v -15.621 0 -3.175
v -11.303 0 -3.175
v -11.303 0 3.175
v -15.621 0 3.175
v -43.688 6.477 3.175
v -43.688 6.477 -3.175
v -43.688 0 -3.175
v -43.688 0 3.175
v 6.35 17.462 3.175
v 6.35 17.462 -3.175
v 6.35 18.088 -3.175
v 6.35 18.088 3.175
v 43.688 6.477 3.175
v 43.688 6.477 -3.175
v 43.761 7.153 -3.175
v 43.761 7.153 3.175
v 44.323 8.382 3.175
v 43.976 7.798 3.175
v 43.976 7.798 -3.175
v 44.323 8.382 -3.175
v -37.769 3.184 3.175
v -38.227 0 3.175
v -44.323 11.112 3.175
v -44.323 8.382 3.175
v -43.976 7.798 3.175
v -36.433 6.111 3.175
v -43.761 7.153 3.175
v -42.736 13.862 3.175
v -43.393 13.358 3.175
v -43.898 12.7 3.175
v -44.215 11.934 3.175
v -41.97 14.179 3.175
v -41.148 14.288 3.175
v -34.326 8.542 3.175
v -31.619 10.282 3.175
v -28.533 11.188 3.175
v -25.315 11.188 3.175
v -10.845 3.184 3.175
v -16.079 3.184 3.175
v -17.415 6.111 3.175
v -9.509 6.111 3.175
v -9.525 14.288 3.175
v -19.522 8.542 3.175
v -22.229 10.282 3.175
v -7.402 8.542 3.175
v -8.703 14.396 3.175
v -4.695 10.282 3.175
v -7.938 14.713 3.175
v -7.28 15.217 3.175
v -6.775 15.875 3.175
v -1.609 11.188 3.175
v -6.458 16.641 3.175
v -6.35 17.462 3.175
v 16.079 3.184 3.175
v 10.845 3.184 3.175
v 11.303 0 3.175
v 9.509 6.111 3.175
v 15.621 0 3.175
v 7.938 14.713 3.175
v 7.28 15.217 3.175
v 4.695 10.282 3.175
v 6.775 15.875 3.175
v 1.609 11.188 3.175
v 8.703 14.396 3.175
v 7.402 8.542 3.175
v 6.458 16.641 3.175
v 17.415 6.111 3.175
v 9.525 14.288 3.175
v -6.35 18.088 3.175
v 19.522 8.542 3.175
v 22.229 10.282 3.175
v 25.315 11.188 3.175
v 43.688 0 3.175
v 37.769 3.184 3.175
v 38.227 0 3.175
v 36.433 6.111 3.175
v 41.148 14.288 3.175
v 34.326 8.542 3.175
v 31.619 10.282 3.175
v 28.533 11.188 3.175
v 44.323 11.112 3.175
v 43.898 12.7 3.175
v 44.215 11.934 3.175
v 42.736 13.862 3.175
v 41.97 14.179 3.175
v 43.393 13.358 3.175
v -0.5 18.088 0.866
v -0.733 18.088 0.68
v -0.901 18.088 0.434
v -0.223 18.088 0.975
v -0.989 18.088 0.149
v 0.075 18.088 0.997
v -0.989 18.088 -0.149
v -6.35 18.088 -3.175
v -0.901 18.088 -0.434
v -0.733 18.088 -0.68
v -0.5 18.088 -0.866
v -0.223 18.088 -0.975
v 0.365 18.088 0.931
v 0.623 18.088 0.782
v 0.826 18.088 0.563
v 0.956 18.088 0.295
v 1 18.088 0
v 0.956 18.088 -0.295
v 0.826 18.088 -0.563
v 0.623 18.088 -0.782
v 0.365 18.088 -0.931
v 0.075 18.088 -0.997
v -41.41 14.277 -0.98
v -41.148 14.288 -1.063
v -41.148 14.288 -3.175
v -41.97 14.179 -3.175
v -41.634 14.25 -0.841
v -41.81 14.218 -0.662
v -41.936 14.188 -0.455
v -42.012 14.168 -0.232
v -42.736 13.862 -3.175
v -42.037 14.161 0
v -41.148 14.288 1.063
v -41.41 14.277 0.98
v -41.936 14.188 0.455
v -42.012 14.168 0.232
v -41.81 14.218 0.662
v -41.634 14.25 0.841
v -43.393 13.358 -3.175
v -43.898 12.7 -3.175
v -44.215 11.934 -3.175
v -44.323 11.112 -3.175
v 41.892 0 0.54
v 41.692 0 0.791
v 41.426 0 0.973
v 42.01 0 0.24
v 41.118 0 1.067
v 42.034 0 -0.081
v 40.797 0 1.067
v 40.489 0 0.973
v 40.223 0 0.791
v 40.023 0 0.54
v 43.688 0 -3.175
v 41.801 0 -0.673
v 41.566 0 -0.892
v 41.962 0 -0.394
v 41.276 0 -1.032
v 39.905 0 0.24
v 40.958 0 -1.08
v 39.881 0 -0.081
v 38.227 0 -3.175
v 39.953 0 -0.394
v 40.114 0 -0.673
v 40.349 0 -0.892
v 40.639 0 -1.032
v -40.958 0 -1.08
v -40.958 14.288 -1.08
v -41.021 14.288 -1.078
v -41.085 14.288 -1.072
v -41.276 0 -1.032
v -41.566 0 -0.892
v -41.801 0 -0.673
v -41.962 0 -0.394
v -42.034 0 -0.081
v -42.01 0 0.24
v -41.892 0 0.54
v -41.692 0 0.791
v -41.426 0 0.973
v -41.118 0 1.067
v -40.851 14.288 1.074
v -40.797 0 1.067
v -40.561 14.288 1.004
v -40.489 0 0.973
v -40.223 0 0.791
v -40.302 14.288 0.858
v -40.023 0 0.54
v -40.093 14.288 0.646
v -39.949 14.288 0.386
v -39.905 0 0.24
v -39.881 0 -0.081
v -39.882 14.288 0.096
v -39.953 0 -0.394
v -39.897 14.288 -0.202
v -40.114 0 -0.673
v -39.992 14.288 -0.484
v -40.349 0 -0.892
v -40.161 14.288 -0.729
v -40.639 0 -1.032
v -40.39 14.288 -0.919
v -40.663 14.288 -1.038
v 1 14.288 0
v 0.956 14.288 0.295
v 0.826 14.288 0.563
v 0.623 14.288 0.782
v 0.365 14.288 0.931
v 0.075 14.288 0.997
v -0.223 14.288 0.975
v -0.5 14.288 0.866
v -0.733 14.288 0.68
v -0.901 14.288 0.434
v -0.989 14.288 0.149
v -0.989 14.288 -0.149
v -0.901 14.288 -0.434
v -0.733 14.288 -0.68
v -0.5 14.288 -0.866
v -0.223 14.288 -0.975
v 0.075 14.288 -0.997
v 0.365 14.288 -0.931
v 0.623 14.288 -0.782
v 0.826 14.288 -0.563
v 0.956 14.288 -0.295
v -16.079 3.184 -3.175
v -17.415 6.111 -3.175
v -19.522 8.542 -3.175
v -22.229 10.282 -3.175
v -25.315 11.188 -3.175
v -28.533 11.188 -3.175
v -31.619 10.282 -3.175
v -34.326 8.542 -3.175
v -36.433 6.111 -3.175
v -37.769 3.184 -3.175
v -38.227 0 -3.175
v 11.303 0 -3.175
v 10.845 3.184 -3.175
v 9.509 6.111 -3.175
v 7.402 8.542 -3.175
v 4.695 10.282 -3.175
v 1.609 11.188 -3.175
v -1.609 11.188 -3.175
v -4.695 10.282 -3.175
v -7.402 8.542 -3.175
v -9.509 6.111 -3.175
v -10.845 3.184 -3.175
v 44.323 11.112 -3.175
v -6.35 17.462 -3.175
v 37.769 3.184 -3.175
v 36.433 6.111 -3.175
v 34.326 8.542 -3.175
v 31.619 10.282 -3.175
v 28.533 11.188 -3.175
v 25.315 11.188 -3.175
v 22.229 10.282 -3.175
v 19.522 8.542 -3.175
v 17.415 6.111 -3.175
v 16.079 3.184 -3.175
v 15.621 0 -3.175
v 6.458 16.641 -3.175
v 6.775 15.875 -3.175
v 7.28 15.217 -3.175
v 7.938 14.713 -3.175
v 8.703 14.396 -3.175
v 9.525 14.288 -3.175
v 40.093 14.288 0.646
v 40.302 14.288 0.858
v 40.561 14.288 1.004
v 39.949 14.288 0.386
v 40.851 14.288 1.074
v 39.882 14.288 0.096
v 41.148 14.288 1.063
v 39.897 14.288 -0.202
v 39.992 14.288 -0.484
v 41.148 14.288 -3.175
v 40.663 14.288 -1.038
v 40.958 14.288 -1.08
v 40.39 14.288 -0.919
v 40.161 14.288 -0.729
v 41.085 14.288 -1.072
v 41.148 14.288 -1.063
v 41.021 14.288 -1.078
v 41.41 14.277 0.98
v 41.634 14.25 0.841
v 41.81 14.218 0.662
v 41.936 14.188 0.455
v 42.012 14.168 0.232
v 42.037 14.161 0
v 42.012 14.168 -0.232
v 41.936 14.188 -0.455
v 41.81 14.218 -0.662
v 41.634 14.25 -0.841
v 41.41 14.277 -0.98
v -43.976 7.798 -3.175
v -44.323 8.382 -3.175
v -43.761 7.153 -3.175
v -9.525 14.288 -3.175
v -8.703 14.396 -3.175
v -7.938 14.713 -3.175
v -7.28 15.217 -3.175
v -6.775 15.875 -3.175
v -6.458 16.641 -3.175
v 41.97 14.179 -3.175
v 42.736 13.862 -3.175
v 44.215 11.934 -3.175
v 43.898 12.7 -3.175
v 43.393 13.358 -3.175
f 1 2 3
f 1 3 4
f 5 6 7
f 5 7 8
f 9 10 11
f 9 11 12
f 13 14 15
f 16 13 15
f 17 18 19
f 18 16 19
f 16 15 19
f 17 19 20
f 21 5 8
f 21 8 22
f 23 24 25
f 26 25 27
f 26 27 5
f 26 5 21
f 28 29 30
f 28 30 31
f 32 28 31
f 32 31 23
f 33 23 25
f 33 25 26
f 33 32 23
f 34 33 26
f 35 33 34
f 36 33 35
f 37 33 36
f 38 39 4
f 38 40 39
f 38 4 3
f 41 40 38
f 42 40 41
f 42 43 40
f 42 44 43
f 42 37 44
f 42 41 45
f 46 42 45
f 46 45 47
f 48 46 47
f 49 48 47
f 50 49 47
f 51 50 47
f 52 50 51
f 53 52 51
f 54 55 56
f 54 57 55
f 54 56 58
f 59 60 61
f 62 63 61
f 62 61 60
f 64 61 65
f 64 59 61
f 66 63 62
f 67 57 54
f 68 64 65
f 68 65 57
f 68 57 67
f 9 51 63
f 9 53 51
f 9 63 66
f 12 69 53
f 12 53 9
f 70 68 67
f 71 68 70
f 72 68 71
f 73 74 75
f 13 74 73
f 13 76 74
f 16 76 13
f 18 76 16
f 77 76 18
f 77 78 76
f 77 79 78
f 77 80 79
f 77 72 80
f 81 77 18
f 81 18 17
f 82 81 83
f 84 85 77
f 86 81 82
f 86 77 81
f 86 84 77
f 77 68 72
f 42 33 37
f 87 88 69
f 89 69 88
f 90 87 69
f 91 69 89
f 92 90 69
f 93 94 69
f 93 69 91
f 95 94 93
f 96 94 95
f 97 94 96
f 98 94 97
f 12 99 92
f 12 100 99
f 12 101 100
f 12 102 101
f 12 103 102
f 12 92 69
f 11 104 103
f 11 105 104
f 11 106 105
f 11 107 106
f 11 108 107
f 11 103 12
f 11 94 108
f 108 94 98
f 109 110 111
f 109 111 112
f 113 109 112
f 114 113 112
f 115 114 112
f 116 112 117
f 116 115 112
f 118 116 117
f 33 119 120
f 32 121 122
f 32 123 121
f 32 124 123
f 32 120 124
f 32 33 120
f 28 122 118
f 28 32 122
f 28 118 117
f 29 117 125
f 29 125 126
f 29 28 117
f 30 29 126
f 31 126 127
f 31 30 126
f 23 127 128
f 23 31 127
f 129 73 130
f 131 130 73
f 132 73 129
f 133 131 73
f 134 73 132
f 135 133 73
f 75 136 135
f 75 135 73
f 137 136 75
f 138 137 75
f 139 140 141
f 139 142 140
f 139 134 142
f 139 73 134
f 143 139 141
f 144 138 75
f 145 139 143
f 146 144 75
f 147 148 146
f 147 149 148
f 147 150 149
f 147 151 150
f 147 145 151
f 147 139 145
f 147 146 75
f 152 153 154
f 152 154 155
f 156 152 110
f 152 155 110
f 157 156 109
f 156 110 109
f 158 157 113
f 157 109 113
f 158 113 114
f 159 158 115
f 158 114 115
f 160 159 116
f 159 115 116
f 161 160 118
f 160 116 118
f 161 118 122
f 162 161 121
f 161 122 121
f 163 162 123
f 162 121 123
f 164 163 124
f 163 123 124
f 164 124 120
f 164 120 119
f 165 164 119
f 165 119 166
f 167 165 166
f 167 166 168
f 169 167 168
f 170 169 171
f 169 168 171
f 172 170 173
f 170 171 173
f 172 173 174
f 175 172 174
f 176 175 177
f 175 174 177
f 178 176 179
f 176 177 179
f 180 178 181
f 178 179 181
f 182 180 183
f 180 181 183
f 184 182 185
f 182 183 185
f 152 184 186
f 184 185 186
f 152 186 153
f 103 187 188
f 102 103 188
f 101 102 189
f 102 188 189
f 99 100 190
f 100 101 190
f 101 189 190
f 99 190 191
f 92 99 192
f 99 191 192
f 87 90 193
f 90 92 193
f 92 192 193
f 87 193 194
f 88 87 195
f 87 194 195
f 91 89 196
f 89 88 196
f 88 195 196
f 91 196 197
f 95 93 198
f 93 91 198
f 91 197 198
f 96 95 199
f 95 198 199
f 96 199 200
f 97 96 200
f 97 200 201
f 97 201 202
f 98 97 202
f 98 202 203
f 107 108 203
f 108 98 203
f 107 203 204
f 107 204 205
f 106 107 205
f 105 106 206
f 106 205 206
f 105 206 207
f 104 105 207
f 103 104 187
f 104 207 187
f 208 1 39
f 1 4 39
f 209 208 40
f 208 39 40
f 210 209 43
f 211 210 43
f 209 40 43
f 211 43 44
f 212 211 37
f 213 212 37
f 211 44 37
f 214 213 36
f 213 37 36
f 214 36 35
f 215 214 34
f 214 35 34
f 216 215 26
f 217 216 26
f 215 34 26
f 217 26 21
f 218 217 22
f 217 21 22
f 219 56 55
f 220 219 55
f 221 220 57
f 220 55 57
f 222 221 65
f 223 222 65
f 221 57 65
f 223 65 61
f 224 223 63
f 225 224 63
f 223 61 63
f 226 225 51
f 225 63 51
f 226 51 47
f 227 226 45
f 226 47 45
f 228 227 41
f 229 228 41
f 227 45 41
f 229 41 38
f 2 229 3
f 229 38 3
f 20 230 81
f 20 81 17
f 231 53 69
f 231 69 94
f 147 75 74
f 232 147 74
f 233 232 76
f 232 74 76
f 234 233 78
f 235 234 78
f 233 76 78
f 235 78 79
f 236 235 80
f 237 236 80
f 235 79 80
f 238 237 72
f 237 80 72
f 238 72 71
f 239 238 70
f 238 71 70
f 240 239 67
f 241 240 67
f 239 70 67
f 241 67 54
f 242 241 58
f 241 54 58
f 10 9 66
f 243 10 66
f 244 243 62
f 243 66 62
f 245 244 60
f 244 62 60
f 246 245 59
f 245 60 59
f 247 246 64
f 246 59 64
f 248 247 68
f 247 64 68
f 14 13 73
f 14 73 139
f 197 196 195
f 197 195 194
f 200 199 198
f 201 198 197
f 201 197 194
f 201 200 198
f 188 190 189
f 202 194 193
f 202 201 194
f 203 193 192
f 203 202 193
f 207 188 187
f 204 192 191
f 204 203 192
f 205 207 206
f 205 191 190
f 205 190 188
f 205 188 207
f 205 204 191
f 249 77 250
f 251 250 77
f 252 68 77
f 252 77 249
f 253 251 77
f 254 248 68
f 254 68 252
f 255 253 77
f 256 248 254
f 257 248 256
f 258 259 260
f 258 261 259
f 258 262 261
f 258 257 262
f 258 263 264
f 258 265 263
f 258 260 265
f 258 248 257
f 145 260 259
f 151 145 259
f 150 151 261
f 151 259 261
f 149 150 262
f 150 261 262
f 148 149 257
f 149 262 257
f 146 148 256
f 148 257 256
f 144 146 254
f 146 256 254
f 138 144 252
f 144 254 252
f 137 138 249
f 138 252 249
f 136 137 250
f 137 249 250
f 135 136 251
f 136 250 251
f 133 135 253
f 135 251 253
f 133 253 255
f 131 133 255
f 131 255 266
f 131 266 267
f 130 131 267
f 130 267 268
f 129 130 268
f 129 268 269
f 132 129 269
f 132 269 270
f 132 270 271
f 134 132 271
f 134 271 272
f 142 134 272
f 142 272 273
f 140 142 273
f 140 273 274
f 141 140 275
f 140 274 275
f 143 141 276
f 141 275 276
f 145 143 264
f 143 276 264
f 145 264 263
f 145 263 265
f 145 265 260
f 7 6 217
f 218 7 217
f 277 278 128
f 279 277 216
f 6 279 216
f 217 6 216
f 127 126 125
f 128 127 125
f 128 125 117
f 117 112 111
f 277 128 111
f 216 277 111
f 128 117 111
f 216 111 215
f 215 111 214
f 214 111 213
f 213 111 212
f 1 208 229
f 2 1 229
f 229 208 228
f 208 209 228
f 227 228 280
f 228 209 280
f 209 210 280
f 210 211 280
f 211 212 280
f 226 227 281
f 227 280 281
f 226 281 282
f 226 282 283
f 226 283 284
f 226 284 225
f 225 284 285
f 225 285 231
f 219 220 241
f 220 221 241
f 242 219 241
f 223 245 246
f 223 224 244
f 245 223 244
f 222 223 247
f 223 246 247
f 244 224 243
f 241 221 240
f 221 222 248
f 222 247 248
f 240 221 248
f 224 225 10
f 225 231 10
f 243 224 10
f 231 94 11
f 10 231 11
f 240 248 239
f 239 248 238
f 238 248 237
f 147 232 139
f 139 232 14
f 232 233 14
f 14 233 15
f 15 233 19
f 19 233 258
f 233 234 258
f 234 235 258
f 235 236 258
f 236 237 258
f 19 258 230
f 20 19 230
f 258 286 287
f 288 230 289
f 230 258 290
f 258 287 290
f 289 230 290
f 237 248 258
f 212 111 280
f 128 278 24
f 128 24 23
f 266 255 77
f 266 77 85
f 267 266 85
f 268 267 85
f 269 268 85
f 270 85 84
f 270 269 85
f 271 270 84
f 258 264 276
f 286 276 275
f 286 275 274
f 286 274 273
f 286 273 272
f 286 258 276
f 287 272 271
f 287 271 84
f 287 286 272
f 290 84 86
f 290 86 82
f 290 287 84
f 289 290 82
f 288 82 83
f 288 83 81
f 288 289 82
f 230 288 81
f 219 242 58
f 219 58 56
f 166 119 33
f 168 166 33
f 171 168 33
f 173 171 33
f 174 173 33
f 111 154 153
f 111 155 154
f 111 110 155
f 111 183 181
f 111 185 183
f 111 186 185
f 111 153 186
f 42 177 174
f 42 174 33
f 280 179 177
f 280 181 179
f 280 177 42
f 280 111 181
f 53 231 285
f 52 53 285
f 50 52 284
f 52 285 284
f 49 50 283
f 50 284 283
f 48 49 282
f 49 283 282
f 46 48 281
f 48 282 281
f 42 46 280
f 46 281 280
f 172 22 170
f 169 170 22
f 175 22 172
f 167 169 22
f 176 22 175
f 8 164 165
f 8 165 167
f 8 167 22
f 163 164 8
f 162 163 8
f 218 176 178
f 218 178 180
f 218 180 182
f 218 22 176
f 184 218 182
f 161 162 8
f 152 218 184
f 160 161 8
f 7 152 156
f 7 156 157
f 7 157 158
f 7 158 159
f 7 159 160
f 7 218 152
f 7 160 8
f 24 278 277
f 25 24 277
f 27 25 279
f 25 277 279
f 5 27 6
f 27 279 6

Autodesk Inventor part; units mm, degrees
ref_plane "YZ Plane" through (0, 0, 0) normal (1, 0, 0) x (0, 1, 0)
ref_plane "XZ Plane" through (0, 0, 0) normal (0, 1, 0) x (-1, 0, 0)
ref_plane "XY Plane" through (0, 0, 0) normal (0, 0, 1) x (1, 0, 0)
sketch "Sketch1" plane through (0, 0, 0) normal (0, 0, 1) x (1, 0, 0)
  line L0 (-44.323, 14.2875) -> (44.323, 14.2875)
  line L1 (44.323, 14.2875) -> (44.323, -14.2875)
  line L2 (44.323, -14.2875) -> (-44.323, -14.2875)
  line L3 (-44.323, -14.2875) -> (-44.323, 14.2875)
  point P0 (0, 0)
  dimension "d0" = 88.646
  dimension "d1" = 44.323
  dimension "d2" = 14.2875
  dimension "d3" = 28.575
extrude "Extrusion1" add sketch "Sketch1" along normal mid plane 6.35
sketch "Sketch2" plane through (0, 0, 3.175) normal (0, 0, 1) x (1, 0, 0)
  circle A0 centre (-26.924, 0) radius 11.303
  circle A1 centre (0, 0) radius 11.303
  line L0 (44.323, -14.2875) -> (44.323, 14.2875) projected
  circle A2 centre (26.924, 0) radius 11.303
  line L1 (-44.323, 14.2875) -> (-44.323, -14.2875) projected
  line L2 (-44.323, 0) -> (44.323, 0) construction
  line L3 (44.323, 14.2875) -> (-44.323, 14.2875) projected
  point P0 (0, 0)
  dimension "d6" = 22.606
  dimension "d9" = 22.606
  dimension "d11" = 22.606
  dimension "d14" = 26.924
  dimension "d21" = 88.646
  dimension "d22" = 26.924
  dimension "d45" = 0
sketch "Sketch4" plane through (-44.323, -14.2875, -3.175) normal (-1, 0, 0) x (0, 0, 1)
  line L0 (0, 0) -> (0, 28.575) projected
  line L1 (6.35, 28.575) -> (6.35, 0) projected
  line L2 (0, 22.6695) -> (6.35, 22.6695)
  line L3 (6.35, 22.6695) -> (6.35, 5.9055)
  line L4 (6.35, 5.9055) -> (0, 5.9055)
  line L5 (0, 5.9055) -> (0, 22.6695)
  point P0 (3.175, 14.2875)
  dimension "d30" = 8.382
  dimension "d31" = 16.764
extrude "Extrusion3" cut sketch "Sketch4" against normal blind 0.635
mirror "Mirror1" about plane through (0, 0, 0) normal (1, 0, 0) of "Extrusion3"
sketch "Sketch7" plane through (-44.323, -14.2875, 3.175) normal (0, -1, 0) x (1, 0, 0)
  line L0 (30.353, -14.605) -> (58.293, -14.605)
  line L1 (58.293, -14.605) -> (58.293, 8.255)
  line L2 (58.293, 8.255) -> (30.353, 8.255)
  line L3 (30.353, 8.255) -> (30.353, -14.605)
  point P0 (44.323, -3.175)
  dimension "d39" = 27.94
  dimension "d40" = 22.86
  dimension "d41" = 11.43
  dimension "d42" = 13.97
extrude "Extrusion5" [suppressed]
extrude "Extrusion6" cut sketch "Sketch2" against normal blind 25.4
sketch "Sketch8" plane through (0, 0, -3.175) normal (0, 0, -1) x (-1, 0, 0)
  line L0 (43.688, 8.382) -> (43.688, -8.382) construction
  line L1 (43.688, 0) -> (-43.688, 0)
  line L2 (-43.688, 8.382) -> (-43.688, -8.382) construction
  line L3 (44.323, 14.2875) -> (-44.323, 14.2875) projected
  line L4 (44.323, 8.382) -> (44.323, 14.2875) projected
  line L5 (-44.323, 14.2875) -> (-44.323, 8.382) projected
  line L6 (-43.688, 8.382) -> (-43.688, 0)
  line L7 (-44.323, 8.382) -> (-43.688, 8.382) projected
  line L8 (43.688, 8.382) -> (43.688, 0)
  line L9 (43.688, 8.382) -> (44.323, 8.382) projected
  point P0 (0, 0)
extrude "Extrusion7" [suppressed]
sketch "Sketch9" plane through (0, 0, -3.175) normal (0, 0, -1) x (-1, 0, 0)
  line L0 (-44.323, -14.2875) -> (44.323, -14.2875) projected
  line L1 (44.323, -14.2875) -> (44.323, -8.382) projected
  line L2 (44.323, -8.382) -> (43.688, -8.382) projected
  line L3 (-43.688, -8.382) -> (-44.323, -8.382) projected
  line L4 (-44.323, -8.382) -> (-44.323, -14.2875) projected
  line L5 (-43.688, 8.382) -> (-43.688, -8.382) projected
  line L6 (-43.688, 0) -> (-43.688, -8.382)
  line L7 (-43.688, 0) -> (43.688, 0)
  line L8 (43.688, -8.382) -> (43.688, 8.382) projected
  line L9 (43.688, -8.382) -> (43.688, 0)
  point P0 (0, 0)
extrude "Extrusion8" cut sketch "Sketch9" against normal through all
fillet "Fillet1" radius 3.175 2 edges at (-44.323, 14.2875, 0) (44.323, 14.2875, 0)
sketch "Sketch12" plane through (-41.148, 14.2875, -3.175) normal (0, 1, 0) x (1, 0, 0)
  line L0 (82.296, -6.35) -> (0, -6.35) projected
  line L1 (34.798, 0) -> (47.498, 0)
  line L2 (47.498, 0) -> (47.498, -6.35)
  line L3 (47.498, -6.35) -> (34.798, -6.35)
  line L4 (34.798, -6.35) -> (34.798, 0)
  circle A0 centre (41.148, -3.175) radius 1
  line L5 (29.845, 0) -> (52.451, 0) projected
  dimension "d81" = 6.35
  dimension "d82" = 12.7
  dimension "d83" = 2
  dimension "d87" = 0
extrude "Extrusion11" add sketch "Sketch12" along normal blind 3.8
fillet "Fillet3" radius 3.175 2 edges at (6.35, 14.2875, 0) (-6.35, 14.2875, 0)
thread "Thread3" size "M2x0.4" class "6H" standard "ANSI Metric M Profile" full length
fillet "Fillet4" radius 3.175 2 edges at (43.688, 8.382, 0) (-43.688, 8.382, 0)
sketch "Sketch10" plane through (-43.688, 0, -3.175) normal (0, -1, 0) x (1, 0, 0)
  line L0 (5.461, 6.35) -> (5.461, 0) projected
  line L1 (0, 0) -> (0, 6.35) projected
  line L2 (-0.635, 0) -> (-0.635, 6.35) projected
  line L3 (5.461, 6.35) -> (5.461, 0) projected
  line L4 (0, 6.35) -> (5.461, 6.35) projected
  line L5 (0, 0) -> (0, 6.35) projected
  line L6 (5.461, 0) -> (0, 0) projected
  circle A0 centre (2.7305, 3.175) radius 1.5494
  line L7 (86.614, 1.27) -> (80.264, 1.27) projected
  line L8 (86.614, 0) -> (80.264, 0) projected
  point P0 (43.688, 3.175)
  point P1 (84.328, 1.27)
  point P2 (77.978, 1.27)
  point P3 (84.328, 0)
  point P4 (77.978, 0)
  dimension "d58" = 3.0988
  dimension "d61" = 5.461
  dimension "d62" = 2.7305
  dimension "d78" = 3.175
  dimension "d90" = 6.35
hole "Hole1" at (-40.9575, 0, 0) direction (0, 1, 0) diameter 2.159 end through all
mirror "Mirror3" about plane through (0, 0, 0) normal (1, 0, 0) of "Hole1"
equation "\"d1\" = 0.5 * d0"
equation "\"d2\" = 0.5 * d3"
equation "\"d9\" = d7"
equation "\"d11\" = d9"
equation "\"d22\" = d14"
equation "\"d30\" = 0.5 * d31"
equation "\"d41\" = 0.5 * d40"
equation "\"d42\" = 0.5 * d39"
equation "\"d81\" = 0.5 * d82"
equation "\"d62\" = 0.5 * d61"
equation "\"d78\" = 0.5 * d90"
equation "\"d7\" = d6"
properties part number "Tube Holder Halve 2" material "Aluminum 6061-AHC"
